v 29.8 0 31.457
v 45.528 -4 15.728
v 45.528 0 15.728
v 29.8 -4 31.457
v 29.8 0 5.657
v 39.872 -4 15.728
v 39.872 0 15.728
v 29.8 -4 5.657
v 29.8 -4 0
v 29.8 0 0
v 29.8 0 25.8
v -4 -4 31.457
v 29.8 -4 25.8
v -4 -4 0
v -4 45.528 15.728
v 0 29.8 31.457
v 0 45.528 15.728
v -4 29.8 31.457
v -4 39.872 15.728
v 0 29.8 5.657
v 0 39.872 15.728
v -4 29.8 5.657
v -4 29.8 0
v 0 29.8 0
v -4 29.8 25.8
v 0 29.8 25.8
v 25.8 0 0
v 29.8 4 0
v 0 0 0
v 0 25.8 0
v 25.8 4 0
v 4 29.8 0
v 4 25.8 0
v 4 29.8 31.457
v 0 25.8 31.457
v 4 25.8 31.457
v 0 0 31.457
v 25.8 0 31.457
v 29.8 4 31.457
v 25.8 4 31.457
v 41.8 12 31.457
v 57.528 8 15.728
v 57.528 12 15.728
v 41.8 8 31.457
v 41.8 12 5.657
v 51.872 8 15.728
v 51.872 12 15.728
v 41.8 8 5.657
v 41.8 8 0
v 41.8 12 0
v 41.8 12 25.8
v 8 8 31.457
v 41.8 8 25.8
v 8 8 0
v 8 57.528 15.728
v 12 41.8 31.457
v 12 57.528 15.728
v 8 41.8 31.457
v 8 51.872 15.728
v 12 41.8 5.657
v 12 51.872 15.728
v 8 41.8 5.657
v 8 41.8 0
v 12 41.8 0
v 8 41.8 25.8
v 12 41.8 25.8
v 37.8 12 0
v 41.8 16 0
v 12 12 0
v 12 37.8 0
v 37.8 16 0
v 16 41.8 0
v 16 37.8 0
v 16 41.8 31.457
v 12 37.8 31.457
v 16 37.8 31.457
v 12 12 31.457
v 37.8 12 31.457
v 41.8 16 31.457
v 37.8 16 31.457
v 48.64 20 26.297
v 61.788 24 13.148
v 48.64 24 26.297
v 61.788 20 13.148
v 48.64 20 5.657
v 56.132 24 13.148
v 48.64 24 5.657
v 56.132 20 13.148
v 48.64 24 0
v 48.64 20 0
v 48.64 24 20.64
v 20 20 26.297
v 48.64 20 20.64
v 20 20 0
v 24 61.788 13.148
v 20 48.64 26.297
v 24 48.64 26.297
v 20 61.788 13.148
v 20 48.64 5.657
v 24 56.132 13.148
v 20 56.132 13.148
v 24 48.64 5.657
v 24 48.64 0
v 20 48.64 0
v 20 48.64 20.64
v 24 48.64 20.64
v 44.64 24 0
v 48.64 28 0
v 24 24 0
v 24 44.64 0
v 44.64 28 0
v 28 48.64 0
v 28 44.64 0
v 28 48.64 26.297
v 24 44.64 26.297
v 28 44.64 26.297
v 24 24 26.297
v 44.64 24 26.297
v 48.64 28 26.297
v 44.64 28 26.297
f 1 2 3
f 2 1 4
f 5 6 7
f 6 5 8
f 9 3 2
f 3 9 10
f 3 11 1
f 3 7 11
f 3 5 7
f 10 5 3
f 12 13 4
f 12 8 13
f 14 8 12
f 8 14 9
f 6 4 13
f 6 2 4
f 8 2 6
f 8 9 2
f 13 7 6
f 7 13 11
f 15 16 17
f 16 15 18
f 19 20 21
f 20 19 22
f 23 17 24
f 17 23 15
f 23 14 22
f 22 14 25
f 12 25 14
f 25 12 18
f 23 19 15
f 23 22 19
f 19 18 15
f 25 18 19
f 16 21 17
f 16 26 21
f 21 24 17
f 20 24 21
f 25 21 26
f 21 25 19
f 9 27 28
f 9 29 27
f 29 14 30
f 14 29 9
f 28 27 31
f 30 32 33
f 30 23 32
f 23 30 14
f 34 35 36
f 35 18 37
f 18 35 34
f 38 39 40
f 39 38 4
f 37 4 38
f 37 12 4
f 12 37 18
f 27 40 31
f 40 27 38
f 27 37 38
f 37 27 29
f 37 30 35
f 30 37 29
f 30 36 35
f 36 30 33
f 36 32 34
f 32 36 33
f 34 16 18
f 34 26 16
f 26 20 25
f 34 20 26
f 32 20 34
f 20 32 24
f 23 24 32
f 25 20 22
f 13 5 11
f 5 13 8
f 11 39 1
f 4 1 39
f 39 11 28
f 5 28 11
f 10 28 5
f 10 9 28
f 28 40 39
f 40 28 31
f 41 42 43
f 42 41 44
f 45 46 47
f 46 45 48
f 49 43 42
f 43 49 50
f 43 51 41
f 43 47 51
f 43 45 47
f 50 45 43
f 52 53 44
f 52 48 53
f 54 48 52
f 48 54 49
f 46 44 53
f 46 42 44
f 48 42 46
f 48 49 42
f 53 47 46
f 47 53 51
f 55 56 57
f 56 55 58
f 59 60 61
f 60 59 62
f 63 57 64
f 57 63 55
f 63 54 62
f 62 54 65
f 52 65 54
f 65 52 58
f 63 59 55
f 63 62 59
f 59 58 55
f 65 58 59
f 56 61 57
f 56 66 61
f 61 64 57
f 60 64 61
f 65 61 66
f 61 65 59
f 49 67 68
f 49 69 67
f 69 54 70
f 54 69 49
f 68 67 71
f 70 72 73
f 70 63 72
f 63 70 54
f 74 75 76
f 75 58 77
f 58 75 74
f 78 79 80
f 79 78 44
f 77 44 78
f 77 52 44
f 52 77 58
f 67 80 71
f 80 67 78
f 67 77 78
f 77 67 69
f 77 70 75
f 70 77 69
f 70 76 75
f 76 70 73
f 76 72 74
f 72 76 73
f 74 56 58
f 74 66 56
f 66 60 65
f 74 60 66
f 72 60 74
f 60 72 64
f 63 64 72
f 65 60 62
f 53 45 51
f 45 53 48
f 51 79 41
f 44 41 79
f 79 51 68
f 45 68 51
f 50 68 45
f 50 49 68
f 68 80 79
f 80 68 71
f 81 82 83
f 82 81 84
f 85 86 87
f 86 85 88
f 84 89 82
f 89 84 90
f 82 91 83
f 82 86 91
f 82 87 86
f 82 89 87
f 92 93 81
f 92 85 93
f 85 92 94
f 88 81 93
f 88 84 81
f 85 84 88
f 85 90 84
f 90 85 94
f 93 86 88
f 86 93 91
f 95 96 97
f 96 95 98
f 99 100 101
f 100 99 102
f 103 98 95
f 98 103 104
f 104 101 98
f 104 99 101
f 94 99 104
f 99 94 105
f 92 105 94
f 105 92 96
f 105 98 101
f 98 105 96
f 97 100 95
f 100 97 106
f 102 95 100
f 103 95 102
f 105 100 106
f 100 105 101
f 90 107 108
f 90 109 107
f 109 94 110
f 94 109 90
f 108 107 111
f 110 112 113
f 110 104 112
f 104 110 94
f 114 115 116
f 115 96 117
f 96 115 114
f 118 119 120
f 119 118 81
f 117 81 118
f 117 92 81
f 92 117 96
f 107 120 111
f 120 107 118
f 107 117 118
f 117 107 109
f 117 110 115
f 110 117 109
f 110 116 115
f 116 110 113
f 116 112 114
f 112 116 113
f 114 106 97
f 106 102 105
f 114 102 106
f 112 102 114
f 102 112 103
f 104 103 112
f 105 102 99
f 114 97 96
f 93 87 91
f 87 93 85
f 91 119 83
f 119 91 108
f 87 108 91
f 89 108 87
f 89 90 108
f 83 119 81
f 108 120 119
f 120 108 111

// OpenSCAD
x=25.8;
y=x;
lip=4;
width=4;
twist=0;
extra=1;

module clip(x,width,lip){
    translate([-width,-width,0]) square([x+2*width,width]);
    translate([-width,-width,0]) square([width,x+2*width]);
    translate([-width,x,0]) square([lip+width,width]);
    translate([x,-width,0]) square([width,lip+width]);
}

module hook(x,width,leg){
    rotate([twist,-45,0]){
        translate([0,0,0]) cube([leg,width,width]);
        translate([x*sqrt(2)/2,0,0]) cube([width,width,leg]);
    }
}


module mount(x,width,lip){
    leg=x*sqrt(2)/2+width;
    z=leg*sqrt(2);
    linear_extrude(height=z*extra,twist=twist) clip(x,width,lip);
    translate([x+width,-width,0]) rotate([0,0,0]) hook(x,width,leg);
    translate([0,x+width,0]) rotate([0,0,90]) hook(x,width,leg);
}

module oneleg() {
    mount(x,width,lip);
    translate([3*lip,3*lip,0]) mount(x,width,lip);
    translate([6*lip,6*lip,0]) mount(x*0.8,width,lip);
}

/*
for (deg=[0:90:360]){
    rotate([0,0,deg]) {
        translate([2*lip,2*lip,0]) oneleg();
    }
}
*/
//oneleg();

module support(){
    intersection(){
        union(){
            difference(){
                translate([-10,-10,0]) cube([20+6*lip+x,20+6*lip+x,0.25]);
                translate([-width-1, -width-1,0]) cube([x+2*width+2,x+2*width+2,.5]);
                translate([3*lip-width-1,3*lip-width-1,0]) cube([x+2*width+2,x+2*width+2,.5]);
                translate([6*lip-width-1,6*lip-width-1,0]) cube([0.8*x+2*width+2,0.8*x+2*width+2,.5]);
            }
            translate([6*lip+width+lip+1,6*lip+width+lip+1,0]) cube([0.8*x+2*width+2,0.8*x+2*width+2,.25]);
            for(dx=[-10:5:x]){
                translate([-10,dx,0]) rotate([0,0,-45]) cube([0.8,3*x,0.5]);
                translate([dx,-10,0]) rotate([0,0,-45]) cube([0.8,3*x,0.5]);
            }
        }
        translate([-10,-10,0]) cube([20+6*lip+x,20+6*lip+x,0.25]);
    }
}

//support();
oneleg();
